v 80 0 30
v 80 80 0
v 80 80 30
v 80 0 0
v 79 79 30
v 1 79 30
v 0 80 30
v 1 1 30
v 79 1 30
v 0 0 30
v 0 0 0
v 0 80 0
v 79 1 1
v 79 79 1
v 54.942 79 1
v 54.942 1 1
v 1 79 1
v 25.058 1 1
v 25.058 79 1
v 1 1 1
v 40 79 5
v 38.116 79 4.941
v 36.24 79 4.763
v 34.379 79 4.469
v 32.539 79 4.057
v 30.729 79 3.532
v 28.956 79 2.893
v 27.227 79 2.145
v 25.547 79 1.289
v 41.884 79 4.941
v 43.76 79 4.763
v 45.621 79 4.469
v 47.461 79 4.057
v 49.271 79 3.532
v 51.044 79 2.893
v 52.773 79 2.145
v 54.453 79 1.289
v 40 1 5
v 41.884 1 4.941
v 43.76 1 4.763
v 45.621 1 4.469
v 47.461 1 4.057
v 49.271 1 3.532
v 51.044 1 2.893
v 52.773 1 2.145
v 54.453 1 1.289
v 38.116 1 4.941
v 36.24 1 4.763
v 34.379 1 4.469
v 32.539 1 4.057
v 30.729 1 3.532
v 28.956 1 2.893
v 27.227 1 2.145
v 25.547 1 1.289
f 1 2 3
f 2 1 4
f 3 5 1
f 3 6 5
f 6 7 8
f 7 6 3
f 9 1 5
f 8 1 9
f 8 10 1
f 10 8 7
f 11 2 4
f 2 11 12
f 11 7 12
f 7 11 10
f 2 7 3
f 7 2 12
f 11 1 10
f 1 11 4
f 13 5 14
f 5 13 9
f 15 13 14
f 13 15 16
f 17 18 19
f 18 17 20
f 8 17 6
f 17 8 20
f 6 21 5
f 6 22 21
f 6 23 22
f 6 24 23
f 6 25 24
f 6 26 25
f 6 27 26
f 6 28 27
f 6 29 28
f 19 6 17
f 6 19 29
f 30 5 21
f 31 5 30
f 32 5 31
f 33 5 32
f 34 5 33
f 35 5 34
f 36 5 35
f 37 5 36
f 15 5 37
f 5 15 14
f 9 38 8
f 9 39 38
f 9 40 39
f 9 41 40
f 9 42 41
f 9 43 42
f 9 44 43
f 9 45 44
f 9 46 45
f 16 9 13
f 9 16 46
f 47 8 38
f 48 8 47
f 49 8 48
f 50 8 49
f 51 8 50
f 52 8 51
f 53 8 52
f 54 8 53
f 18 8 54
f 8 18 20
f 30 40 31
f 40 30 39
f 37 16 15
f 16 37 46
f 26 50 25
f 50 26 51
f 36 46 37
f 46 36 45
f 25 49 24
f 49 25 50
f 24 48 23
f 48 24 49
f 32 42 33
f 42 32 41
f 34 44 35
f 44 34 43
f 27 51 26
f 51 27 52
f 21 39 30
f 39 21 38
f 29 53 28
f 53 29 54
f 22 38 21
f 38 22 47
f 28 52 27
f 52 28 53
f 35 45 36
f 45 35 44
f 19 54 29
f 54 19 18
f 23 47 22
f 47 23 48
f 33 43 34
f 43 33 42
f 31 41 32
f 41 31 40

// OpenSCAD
union() {
    difference() {
        cube([80, 80, 30]);
        translate([1,1,1]) {
            cube([78, 78, 30]);
        };
    };
    intersection() {
        translate([-1, -1, 0]) cube([82, 82, 62]);
        translate([40, 80, -25]) {
            rotate([90, 0, 0]) {
                cylinder(h=80, r=30, $fn=100);
            }
        }
    };
}
